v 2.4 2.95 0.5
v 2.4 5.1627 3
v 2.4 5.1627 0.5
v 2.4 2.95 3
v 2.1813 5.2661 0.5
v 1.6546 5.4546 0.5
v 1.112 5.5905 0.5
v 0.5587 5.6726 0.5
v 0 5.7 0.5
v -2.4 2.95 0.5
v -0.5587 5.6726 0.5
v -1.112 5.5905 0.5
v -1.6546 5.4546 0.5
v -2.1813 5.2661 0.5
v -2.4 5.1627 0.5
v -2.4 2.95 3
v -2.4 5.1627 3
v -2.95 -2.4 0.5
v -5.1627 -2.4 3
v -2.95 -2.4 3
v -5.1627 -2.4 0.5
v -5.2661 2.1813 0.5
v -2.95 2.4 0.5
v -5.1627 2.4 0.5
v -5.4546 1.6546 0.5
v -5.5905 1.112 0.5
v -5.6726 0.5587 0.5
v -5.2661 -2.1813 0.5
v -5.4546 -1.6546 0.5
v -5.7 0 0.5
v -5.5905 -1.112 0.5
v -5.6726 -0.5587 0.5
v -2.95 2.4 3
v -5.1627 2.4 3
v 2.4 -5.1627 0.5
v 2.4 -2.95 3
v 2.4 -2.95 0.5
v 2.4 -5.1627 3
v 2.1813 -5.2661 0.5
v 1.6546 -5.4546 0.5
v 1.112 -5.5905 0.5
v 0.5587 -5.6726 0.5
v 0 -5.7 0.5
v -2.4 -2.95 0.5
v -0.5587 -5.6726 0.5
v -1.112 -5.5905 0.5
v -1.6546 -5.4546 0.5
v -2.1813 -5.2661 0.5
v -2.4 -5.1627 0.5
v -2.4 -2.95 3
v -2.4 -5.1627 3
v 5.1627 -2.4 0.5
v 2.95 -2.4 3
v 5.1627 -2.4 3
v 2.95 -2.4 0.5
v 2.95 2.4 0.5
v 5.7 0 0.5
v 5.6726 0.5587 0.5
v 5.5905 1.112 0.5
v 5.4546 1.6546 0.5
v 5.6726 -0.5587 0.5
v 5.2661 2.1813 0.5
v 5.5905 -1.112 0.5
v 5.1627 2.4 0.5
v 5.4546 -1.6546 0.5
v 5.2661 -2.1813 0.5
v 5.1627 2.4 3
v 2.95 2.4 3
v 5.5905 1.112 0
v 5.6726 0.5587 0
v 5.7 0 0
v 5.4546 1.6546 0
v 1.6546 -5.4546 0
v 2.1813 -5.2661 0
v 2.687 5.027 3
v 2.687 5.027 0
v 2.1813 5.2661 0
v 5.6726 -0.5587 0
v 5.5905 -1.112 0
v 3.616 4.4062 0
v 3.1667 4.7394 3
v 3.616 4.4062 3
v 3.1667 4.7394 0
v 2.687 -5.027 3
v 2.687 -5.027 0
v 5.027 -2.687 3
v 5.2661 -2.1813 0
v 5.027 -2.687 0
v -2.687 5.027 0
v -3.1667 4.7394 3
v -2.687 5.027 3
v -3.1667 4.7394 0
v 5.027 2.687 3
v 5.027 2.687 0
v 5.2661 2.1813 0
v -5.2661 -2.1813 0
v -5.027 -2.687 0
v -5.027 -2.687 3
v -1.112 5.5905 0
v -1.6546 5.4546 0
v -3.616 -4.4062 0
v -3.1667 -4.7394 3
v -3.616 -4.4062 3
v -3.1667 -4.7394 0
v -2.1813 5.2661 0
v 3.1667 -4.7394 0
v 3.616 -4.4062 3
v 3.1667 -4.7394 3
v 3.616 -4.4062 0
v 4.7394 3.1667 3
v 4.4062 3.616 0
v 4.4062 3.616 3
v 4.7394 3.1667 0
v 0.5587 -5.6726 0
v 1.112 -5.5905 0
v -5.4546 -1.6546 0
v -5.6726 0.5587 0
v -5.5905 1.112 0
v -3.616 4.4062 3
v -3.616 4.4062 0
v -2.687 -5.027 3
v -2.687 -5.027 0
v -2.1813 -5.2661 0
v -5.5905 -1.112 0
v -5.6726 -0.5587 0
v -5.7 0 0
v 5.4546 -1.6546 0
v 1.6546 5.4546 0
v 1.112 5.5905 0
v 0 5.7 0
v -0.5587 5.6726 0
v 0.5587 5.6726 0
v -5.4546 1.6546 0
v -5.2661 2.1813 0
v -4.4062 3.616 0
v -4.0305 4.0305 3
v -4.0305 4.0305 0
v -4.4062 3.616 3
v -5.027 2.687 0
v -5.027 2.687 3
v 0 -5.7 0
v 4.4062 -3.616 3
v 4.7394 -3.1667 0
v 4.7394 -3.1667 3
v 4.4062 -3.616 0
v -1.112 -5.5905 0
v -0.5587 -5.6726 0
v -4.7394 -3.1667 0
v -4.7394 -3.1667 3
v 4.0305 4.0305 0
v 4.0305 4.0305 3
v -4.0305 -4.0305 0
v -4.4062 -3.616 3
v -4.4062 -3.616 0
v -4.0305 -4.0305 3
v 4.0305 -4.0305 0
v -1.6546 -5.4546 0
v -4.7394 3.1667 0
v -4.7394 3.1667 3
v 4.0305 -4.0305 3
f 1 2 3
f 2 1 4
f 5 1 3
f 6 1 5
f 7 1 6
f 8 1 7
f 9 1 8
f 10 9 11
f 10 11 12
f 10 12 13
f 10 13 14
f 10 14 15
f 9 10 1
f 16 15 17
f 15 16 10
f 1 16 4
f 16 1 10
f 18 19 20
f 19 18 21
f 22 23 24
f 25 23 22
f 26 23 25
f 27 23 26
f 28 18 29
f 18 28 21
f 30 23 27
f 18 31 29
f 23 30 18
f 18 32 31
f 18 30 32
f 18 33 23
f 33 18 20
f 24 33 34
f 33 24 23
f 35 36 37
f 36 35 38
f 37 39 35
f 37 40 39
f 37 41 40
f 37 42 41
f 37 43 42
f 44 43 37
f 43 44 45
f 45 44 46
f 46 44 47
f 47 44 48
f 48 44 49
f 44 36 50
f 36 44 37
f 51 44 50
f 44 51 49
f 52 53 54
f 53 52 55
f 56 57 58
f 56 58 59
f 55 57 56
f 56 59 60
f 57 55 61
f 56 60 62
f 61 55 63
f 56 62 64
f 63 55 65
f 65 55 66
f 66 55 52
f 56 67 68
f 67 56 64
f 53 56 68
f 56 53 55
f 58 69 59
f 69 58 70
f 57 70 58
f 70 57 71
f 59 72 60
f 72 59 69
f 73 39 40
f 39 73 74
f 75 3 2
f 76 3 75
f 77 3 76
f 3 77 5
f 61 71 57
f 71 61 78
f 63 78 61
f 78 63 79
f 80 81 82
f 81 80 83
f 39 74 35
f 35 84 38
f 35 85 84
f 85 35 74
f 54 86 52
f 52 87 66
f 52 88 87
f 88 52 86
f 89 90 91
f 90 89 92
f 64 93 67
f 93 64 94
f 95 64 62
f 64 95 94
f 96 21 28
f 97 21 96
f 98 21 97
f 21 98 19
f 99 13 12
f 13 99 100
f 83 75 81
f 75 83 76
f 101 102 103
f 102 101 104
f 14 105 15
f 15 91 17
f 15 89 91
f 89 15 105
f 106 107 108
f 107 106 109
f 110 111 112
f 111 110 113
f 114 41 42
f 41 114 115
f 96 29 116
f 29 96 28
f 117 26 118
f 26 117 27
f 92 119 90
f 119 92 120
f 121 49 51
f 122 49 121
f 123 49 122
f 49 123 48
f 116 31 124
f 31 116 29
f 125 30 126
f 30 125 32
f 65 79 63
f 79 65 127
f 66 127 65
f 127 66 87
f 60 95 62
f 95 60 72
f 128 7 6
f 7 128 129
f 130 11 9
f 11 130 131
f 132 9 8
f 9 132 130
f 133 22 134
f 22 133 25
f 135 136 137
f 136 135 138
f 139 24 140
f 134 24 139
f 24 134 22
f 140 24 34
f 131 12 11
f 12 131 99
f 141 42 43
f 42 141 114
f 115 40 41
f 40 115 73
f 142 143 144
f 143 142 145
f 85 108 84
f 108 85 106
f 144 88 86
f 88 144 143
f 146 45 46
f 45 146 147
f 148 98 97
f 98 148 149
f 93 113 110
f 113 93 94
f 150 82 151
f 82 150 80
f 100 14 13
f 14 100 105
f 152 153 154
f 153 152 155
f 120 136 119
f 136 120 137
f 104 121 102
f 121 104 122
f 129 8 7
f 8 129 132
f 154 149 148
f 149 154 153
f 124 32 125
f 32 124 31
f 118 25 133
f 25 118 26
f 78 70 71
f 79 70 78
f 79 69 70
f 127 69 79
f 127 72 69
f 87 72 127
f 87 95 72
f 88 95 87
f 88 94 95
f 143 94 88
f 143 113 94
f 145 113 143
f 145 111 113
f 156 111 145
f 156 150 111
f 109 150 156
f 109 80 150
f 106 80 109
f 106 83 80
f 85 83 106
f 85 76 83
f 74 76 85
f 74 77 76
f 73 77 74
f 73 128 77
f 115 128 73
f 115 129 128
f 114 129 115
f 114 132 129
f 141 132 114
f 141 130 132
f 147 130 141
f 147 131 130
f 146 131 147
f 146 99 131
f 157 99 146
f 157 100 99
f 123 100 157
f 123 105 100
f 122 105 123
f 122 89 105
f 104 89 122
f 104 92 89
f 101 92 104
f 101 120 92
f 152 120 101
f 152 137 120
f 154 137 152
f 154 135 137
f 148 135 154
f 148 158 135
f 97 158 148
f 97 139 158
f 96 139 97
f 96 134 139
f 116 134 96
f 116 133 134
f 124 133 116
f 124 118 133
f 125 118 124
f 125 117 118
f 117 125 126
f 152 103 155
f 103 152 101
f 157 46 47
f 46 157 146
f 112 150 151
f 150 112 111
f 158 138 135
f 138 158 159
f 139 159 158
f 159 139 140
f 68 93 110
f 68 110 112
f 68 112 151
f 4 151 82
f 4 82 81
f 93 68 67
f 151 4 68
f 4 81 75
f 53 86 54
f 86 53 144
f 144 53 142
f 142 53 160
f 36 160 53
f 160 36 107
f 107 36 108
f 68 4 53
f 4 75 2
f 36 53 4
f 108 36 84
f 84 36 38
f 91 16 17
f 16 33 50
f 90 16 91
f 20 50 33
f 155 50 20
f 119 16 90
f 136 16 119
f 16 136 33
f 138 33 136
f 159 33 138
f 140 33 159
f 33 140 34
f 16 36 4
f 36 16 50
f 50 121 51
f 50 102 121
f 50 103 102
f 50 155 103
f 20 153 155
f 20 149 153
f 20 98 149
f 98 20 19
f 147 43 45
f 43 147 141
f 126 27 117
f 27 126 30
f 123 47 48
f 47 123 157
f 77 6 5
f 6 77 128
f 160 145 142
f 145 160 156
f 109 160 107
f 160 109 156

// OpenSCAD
// file: consts.scad
STRIPE_X = 3.4; //width of the LED stripe pcb
STRIPE_Y = 48.5; //length of LED stripe pcb
STRIPE_Z = 0.6; //pcb thickness of LED stripe pcb
LED_X=2; //edge length of LED (assumed to be square)
LED_Z = 1; //LED height above PCB

FIL_D = 0.25; //fiber diameter
NOZ_D = 0.4; //nozzle diameter
CLIP_Z = 5; //height of clip
N = 64; //number of fibers

D_I = 11.6; //inner diameter of pen
D_O = D_I+4*NOZ_D; //outer diameter of pen

CLIP_X = 2*FIL_D+4*NOZ_D;
CLIP_L = 2*N*FIL_D+4*NOZ_D;

CAP_H = 3; //height of cap cylinder attached to clip

PEN_UPPER_Z = 60; //height of upper pen part 
PEN_LOWER_BODY_Z = 60; //height of the cylindrical part
PEN_LOWER_TIP_Z = 20; //height of the tip cone

FIBER_CLAMP_Z = 2;
FIBER_CLAMP_X = 1.2;

STRIPE_JOINER_Z = 3; //height of the 4stripe joiner
// main file
include <consts.scad>


//Holder that joins 4 stripe holder
//Put tape on the outside to actually hold the stripes in (tape is thinner than a printed layer)
//
// Use nomal filament

$fn=64;

STRIPE_PLAY_Y = 0.2;
PLAY_IN_PEN = 0.2;
STRIPE_HOLDER_X = (STRIPE_X+1)+0.4;
STRIPE_HOLDER_Y = (LED_Z+STRIPE_Z)+0.5+STRIPE_PLAY_Y;




difference() {
    cylinder(h=STRIPE_JOINER_Z, d=D_I-PLAY_IN_PEN);
    
    for(i=[0:3])rotate([0,0,90*i])translate([0,D_I/2-1.7+0.5,STRIPE_JOINER_Z/2+0.5])cube([STRIPE_HOLDER_X, STRIPE_HOLDER_Y+1, STRIPE_JOINER_Z], center=true);
}
